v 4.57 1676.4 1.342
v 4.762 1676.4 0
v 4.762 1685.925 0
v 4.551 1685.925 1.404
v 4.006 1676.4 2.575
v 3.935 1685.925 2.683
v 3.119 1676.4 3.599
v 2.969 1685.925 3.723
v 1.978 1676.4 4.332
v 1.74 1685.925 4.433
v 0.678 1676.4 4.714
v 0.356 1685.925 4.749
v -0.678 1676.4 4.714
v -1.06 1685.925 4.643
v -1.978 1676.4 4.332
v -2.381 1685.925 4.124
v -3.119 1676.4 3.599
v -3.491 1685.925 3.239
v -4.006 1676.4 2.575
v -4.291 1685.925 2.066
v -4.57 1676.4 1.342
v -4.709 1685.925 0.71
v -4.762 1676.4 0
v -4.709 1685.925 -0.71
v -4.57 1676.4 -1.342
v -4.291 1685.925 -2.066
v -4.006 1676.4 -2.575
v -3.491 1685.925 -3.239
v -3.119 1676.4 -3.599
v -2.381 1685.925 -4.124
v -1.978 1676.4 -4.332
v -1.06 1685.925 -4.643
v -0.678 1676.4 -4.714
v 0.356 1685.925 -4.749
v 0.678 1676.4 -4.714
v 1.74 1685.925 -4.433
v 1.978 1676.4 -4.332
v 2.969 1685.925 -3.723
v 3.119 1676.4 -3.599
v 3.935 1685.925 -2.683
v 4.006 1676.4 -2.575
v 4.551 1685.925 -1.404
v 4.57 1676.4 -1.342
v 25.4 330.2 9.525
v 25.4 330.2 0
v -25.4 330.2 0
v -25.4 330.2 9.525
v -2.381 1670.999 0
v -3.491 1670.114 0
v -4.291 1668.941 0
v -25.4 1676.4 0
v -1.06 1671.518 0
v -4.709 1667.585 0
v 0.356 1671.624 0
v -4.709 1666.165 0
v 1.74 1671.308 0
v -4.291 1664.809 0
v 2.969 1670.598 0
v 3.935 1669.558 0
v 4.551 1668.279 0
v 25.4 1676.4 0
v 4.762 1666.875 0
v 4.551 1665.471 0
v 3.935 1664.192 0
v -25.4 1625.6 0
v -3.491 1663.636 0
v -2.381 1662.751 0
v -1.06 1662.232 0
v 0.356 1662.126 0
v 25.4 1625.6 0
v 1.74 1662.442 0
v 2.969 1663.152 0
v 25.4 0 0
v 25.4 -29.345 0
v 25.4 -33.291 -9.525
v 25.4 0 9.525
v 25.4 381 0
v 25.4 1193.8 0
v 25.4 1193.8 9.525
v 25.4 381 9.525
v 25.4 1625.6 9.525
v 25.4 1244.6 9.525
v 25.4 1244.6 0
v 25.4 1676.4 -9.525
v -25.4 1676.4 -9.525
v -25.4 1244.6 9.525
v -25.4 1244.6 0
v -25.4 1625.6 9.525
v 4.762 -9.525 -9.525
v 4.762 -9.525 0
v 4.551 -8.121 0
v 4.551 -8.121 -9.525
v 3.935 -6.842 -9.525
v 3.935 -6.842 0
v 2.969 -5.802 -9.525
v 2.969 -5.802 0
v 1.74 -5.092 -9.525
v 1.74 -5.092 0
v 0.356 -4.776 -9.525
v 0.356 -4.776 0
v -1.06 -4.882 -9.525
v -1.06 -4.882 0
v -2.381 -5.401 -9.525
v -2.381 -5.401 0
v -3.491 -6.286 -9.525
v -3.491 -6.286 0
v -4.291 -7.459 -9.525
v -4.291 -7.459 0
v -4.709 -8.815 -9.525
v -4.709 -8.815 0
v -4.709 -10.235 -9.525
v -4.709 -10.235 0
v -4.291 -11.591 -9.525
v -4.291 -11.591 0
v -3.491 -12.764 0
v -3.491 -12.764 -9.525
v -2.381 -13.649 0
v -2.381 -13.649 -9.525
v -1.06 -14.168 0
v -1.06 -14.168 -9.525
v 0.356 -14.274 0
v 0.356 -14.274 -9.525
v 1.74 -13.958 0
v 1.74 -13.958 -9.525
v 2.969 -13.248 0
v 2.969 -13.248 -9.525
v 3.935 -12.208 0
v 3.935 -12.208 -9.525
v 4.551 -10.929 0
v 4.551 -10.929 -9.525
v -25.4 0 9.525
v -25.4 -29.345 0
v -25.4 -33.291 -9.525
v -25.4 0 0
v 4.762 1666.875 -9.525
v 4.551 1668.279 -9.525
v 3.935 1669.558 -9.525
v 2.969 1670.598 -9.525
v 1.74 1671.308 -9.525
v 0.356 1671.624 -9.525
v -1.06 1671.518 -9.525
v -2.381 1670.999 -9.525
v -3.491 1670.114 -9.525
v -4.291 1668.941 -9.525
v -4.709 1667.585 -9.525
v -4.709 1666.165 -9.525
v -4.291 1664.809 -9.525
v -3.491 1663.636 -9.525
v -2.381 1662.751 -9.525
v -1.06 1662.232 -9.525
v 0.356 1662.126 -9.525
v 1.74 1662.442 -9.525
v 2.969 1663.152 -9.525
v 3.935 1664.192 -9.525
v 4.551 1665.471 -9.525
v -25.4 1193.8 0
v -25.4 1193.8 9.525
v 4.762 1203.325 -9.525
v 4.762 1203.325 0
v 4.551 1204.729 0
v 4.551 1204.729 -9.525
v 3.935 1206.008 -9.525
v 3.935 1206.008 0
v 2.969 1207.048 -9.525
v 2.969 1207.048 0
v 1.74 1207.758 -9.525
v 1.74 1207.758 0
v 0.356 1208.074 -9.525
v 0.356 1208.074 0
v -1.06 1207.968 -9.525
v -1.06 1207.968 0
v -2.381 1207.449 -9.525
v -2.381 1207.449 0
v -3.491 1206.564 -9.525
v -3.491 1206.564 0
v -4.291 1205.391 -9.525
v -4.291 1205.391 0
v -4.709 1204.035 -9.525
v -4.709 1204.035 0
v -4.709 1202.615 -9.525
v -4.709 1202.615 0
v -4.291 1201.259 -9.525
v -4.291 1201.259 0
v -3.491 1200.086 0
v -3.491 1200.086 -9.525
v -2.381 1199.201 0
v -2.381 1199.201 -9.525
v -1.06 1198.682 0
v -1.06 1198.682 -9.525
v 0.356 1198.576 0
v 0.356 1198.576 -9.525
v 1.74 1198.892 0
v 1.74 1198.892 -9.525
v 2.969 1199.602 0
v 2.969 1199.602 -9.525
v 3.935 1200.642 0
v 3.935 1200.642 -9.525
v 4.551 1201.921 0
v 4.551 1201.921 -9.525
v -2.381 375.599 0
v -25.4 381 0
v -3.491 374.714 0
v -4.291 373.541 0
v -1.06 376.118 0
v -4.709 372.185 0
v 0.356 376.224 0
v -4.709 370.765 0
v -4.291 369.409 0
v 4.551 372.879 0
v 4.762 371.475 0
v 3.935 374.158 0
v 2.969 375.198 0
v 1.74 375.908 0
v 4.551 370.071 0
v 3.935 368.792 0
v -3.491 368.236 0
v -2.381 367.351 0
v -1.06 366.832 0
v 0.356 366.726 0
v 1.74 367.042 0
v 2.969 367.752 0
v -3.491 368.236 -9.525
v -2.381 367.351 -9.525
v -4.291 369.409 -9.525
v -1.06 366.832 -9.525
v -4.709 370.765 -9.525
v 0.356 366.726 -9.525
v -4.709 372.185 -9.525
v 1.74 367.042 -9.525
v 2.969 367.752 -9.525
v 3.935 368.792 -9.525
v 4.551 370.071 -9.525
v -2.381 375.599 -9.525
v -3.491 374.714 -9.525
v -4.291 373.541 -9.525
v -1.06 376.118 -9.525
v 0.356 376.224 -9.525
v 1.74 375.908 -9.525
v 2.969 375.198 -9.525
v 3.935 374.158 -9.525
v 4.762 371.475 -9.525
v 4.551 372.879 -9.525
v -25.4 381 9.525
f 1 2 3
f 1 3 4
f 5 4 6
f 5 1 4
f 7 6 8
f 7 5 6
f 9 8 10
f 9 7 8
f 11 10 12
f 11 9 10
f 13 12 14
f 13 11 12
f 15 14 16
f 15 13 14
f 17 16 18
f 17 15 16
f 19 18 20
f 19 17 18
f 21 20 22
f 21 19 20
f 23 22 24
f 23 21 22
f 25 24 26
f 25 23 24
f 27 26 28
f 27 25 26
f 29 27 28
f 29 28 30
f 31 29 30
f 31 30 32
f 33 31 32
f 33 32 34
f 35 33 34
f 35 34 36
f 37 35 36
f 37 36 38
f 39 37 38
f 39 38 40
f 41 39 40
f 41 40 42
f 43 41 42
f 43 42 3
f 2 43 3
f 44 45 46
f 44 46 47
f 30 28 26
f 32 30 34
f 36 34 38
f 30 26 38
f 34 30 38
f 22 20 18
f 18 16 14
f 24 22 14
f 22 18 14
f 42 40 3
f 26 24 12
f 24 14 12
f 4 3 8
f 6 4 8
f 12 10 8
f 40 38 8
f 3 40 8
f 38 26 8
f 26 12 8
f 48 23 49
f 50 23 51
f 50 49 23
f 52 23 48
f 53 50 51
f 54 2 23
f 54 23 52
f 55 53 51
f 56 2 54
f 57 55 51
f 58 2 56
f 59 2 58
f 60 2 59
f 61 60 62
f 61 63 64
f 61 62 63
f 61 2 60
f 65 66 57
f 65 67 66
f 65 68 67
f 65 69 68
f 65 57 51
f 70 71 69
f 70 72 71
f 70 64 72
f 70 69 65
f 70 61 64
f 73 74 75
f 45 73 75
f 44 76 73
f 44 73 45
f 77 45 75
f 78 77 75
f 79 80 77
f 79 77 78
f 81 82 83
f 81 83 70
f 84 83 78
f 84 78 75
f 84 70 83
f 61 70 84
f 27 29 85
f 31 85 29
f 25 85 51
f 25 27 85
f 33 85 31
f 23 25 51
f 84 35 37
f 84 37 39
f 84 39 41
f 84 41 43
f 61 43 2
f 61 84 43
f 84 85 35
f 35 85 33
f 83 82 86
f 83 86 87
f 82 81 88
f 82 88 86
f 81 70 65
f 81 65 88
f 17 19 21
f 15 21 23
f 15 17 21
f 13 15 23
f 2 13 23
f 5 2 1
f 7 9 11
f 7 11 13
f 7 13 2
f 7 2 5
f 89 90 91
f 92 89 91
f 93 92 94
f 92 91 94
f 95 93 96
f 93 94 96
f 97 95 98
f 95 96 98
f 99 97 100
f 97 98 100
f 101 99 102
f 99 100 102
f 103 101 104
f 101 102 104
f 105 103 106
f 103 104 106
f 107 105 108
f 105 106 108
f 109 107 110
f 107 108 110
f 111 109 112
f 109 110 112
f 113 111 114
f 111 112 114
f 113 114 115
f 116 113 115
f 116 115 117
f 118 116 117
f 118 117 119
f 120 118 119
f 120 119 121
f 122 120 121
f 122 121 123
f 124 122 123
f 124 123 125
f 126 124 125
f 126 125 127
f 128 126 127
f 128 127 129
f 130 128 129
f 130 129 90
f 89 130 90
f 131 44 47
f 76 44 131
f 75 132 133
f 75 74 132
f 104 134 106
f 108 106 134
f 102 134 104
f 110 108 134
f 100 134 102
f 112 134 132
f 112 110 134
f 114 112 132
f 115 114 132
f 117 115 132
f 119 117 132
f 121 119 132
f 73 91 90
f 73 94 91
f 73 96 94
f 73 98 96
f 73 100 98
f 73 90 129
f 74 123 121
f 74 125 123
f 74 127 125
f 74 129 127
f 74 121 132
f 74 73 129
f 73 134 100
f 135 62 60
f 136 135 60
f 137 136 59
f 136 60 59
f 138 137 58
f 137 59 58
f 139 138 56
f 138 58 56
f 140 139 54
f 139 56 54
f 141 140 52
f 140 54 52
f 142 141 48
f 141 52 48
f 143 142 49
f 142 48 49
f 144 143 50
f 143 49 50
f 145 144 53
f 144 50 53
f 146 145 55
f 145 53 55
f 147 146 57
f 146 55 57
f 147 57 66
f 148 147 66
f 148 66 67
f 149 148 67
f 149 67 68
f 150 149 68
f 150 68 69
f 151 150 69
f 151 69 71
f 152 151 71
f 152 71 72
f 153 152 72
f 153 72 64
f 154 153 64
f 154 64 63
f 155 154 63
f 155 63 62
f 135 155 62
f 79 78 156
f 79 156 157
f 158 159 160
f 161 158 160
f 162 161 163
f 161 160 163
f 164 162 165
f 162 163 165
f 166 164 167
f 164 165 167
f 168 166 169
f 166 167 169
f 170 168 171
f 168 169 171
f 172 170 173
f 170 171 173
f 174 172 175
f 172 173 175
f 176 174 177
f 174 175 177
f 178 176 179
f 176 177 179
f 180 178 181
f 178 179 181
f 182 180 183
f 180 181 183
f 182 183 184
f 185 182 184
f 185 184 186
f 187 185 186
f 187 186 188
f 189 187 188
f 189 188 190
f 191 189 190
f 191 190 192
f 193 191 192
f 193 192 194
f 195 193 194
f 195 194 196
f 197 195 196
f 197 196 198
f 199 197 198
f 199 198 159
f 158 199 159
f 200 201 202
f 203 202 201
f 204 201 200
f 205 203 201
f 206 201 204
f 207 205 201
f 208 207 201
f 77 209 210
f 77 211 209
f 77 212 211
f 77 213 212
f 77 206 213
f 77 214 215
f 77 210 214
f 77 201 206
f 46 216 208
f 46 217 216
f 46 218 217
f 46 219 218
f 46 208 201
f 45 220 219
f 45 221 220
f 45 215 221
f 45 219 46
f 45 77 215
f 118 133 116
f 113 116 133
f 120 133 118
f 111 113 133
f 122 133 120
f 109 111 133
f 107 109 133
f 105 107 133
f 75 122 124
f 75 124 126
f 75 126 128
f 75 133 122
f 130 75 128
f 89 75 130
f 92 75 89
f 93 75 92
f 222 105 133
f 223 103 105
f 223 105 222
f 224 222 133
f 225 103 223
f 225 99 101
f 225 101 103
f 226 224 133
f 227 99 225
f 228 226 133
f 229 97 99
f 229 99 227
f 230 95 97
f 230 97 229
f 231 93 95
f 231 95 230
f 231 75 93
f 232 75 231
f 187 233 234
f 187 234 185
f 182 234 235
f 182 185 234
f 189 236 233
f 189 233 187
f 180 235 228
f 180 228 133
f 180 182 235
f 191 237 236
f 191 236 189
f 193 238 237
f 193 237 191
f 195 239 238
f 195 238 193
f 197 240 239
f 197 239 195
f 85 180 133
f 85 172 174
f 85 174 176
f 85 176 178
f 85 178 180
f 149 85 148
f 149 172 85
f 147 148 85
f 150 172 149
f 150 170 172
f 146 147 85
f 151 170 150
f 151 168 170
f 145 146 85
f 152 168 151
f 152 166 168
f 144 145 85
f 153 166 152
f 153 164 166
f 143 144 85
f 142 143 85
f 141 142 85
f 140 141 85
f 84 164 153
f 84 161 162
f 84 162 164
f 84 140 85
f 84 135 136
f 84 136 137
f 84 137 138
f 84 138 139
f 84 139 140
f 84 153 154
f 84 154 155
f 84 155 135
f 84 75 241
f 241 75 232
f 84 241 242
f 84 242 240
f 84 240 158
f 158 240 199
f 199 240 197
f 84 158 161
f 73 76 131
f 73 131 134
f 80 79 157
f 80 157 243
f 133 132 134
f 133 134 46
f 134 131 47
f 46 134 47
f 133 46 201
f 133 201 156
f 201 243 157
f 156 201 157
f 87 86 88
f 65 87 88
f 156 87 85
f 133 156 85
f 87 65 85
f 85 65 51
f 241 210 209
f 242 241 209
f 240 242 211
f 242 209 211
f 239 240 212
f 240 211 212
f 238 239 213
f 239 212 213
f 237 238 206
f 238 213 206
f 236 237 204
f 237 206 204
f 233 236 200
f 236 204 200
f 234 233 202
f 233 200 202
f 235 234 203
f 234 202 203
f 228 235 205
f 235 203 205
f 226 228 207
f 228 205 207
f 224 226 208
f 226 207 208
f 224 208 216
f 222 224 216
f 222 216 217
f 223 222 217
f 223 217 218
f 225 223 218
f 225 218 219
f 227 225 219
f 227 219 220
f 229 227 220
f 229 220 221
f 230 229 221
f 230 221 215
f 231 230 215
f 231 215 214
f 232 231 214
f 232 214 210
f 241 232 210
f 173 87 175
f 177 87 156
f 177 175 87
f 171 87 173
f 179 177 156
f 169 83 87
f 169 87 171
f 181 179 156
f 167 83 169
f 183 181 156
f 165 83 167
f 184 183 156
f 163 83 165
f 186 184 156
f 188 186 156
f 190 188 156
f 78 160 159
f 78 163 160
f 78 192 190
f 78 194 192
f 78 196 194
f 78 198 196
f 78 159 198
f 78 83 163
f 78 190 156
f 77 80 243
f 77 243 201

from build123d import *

# Parameters (mm, degrees)
F1_DEPTH = 25.4
F3_R     = 4.7625
F4_DEPTH = 9.525
F5_R     = 4.7625
F6_DEPTH = 25.4


with BuildPart() as f1:
    # F0 (on Right) → F1 (new body, symmetric)
    with BuildSketch(Plane.YZ):
        Polygon((-33.290768, -9.525), (1676.4, -9.525), (1676.4, 0), (1625.6, 0), (1625.6, 9.525), (1244.6, 9.525), (1244.6, 0), (1193.8, 0), (1193.8, 9.525), (381, 9.525), (381, 0), (330.2, 0), (330.2, 9.525), (0, 9.525), (0, 0), (-29.345384, 0), align=None)
    extrude(amount=F1_DEPTH, both=True)

    # F3 (on offset) → F4 (join)
    with BuildSketch(Plane.XZ.offset(-1676.4)):
        Circle(F3_R)
    extrude(amount=-F4_DEPTH)

    # F5 (on Top) → F6 (cut)
    with BuildSketch(Plane.XY):
        with Locations((0, 371.475)):
            Circle(F5_R)
        with Locations((0, 1203.325)):
            Circle(F5_R)
        with Locations((0, 1666.875)):
            Circle(F5_R)
        with Locations((0, -9.525)):
            Circle(F5_R)
    extrude(amount=-F6_DEPTH, mode=Mode.SUBTRACT)


solid = f1.part
